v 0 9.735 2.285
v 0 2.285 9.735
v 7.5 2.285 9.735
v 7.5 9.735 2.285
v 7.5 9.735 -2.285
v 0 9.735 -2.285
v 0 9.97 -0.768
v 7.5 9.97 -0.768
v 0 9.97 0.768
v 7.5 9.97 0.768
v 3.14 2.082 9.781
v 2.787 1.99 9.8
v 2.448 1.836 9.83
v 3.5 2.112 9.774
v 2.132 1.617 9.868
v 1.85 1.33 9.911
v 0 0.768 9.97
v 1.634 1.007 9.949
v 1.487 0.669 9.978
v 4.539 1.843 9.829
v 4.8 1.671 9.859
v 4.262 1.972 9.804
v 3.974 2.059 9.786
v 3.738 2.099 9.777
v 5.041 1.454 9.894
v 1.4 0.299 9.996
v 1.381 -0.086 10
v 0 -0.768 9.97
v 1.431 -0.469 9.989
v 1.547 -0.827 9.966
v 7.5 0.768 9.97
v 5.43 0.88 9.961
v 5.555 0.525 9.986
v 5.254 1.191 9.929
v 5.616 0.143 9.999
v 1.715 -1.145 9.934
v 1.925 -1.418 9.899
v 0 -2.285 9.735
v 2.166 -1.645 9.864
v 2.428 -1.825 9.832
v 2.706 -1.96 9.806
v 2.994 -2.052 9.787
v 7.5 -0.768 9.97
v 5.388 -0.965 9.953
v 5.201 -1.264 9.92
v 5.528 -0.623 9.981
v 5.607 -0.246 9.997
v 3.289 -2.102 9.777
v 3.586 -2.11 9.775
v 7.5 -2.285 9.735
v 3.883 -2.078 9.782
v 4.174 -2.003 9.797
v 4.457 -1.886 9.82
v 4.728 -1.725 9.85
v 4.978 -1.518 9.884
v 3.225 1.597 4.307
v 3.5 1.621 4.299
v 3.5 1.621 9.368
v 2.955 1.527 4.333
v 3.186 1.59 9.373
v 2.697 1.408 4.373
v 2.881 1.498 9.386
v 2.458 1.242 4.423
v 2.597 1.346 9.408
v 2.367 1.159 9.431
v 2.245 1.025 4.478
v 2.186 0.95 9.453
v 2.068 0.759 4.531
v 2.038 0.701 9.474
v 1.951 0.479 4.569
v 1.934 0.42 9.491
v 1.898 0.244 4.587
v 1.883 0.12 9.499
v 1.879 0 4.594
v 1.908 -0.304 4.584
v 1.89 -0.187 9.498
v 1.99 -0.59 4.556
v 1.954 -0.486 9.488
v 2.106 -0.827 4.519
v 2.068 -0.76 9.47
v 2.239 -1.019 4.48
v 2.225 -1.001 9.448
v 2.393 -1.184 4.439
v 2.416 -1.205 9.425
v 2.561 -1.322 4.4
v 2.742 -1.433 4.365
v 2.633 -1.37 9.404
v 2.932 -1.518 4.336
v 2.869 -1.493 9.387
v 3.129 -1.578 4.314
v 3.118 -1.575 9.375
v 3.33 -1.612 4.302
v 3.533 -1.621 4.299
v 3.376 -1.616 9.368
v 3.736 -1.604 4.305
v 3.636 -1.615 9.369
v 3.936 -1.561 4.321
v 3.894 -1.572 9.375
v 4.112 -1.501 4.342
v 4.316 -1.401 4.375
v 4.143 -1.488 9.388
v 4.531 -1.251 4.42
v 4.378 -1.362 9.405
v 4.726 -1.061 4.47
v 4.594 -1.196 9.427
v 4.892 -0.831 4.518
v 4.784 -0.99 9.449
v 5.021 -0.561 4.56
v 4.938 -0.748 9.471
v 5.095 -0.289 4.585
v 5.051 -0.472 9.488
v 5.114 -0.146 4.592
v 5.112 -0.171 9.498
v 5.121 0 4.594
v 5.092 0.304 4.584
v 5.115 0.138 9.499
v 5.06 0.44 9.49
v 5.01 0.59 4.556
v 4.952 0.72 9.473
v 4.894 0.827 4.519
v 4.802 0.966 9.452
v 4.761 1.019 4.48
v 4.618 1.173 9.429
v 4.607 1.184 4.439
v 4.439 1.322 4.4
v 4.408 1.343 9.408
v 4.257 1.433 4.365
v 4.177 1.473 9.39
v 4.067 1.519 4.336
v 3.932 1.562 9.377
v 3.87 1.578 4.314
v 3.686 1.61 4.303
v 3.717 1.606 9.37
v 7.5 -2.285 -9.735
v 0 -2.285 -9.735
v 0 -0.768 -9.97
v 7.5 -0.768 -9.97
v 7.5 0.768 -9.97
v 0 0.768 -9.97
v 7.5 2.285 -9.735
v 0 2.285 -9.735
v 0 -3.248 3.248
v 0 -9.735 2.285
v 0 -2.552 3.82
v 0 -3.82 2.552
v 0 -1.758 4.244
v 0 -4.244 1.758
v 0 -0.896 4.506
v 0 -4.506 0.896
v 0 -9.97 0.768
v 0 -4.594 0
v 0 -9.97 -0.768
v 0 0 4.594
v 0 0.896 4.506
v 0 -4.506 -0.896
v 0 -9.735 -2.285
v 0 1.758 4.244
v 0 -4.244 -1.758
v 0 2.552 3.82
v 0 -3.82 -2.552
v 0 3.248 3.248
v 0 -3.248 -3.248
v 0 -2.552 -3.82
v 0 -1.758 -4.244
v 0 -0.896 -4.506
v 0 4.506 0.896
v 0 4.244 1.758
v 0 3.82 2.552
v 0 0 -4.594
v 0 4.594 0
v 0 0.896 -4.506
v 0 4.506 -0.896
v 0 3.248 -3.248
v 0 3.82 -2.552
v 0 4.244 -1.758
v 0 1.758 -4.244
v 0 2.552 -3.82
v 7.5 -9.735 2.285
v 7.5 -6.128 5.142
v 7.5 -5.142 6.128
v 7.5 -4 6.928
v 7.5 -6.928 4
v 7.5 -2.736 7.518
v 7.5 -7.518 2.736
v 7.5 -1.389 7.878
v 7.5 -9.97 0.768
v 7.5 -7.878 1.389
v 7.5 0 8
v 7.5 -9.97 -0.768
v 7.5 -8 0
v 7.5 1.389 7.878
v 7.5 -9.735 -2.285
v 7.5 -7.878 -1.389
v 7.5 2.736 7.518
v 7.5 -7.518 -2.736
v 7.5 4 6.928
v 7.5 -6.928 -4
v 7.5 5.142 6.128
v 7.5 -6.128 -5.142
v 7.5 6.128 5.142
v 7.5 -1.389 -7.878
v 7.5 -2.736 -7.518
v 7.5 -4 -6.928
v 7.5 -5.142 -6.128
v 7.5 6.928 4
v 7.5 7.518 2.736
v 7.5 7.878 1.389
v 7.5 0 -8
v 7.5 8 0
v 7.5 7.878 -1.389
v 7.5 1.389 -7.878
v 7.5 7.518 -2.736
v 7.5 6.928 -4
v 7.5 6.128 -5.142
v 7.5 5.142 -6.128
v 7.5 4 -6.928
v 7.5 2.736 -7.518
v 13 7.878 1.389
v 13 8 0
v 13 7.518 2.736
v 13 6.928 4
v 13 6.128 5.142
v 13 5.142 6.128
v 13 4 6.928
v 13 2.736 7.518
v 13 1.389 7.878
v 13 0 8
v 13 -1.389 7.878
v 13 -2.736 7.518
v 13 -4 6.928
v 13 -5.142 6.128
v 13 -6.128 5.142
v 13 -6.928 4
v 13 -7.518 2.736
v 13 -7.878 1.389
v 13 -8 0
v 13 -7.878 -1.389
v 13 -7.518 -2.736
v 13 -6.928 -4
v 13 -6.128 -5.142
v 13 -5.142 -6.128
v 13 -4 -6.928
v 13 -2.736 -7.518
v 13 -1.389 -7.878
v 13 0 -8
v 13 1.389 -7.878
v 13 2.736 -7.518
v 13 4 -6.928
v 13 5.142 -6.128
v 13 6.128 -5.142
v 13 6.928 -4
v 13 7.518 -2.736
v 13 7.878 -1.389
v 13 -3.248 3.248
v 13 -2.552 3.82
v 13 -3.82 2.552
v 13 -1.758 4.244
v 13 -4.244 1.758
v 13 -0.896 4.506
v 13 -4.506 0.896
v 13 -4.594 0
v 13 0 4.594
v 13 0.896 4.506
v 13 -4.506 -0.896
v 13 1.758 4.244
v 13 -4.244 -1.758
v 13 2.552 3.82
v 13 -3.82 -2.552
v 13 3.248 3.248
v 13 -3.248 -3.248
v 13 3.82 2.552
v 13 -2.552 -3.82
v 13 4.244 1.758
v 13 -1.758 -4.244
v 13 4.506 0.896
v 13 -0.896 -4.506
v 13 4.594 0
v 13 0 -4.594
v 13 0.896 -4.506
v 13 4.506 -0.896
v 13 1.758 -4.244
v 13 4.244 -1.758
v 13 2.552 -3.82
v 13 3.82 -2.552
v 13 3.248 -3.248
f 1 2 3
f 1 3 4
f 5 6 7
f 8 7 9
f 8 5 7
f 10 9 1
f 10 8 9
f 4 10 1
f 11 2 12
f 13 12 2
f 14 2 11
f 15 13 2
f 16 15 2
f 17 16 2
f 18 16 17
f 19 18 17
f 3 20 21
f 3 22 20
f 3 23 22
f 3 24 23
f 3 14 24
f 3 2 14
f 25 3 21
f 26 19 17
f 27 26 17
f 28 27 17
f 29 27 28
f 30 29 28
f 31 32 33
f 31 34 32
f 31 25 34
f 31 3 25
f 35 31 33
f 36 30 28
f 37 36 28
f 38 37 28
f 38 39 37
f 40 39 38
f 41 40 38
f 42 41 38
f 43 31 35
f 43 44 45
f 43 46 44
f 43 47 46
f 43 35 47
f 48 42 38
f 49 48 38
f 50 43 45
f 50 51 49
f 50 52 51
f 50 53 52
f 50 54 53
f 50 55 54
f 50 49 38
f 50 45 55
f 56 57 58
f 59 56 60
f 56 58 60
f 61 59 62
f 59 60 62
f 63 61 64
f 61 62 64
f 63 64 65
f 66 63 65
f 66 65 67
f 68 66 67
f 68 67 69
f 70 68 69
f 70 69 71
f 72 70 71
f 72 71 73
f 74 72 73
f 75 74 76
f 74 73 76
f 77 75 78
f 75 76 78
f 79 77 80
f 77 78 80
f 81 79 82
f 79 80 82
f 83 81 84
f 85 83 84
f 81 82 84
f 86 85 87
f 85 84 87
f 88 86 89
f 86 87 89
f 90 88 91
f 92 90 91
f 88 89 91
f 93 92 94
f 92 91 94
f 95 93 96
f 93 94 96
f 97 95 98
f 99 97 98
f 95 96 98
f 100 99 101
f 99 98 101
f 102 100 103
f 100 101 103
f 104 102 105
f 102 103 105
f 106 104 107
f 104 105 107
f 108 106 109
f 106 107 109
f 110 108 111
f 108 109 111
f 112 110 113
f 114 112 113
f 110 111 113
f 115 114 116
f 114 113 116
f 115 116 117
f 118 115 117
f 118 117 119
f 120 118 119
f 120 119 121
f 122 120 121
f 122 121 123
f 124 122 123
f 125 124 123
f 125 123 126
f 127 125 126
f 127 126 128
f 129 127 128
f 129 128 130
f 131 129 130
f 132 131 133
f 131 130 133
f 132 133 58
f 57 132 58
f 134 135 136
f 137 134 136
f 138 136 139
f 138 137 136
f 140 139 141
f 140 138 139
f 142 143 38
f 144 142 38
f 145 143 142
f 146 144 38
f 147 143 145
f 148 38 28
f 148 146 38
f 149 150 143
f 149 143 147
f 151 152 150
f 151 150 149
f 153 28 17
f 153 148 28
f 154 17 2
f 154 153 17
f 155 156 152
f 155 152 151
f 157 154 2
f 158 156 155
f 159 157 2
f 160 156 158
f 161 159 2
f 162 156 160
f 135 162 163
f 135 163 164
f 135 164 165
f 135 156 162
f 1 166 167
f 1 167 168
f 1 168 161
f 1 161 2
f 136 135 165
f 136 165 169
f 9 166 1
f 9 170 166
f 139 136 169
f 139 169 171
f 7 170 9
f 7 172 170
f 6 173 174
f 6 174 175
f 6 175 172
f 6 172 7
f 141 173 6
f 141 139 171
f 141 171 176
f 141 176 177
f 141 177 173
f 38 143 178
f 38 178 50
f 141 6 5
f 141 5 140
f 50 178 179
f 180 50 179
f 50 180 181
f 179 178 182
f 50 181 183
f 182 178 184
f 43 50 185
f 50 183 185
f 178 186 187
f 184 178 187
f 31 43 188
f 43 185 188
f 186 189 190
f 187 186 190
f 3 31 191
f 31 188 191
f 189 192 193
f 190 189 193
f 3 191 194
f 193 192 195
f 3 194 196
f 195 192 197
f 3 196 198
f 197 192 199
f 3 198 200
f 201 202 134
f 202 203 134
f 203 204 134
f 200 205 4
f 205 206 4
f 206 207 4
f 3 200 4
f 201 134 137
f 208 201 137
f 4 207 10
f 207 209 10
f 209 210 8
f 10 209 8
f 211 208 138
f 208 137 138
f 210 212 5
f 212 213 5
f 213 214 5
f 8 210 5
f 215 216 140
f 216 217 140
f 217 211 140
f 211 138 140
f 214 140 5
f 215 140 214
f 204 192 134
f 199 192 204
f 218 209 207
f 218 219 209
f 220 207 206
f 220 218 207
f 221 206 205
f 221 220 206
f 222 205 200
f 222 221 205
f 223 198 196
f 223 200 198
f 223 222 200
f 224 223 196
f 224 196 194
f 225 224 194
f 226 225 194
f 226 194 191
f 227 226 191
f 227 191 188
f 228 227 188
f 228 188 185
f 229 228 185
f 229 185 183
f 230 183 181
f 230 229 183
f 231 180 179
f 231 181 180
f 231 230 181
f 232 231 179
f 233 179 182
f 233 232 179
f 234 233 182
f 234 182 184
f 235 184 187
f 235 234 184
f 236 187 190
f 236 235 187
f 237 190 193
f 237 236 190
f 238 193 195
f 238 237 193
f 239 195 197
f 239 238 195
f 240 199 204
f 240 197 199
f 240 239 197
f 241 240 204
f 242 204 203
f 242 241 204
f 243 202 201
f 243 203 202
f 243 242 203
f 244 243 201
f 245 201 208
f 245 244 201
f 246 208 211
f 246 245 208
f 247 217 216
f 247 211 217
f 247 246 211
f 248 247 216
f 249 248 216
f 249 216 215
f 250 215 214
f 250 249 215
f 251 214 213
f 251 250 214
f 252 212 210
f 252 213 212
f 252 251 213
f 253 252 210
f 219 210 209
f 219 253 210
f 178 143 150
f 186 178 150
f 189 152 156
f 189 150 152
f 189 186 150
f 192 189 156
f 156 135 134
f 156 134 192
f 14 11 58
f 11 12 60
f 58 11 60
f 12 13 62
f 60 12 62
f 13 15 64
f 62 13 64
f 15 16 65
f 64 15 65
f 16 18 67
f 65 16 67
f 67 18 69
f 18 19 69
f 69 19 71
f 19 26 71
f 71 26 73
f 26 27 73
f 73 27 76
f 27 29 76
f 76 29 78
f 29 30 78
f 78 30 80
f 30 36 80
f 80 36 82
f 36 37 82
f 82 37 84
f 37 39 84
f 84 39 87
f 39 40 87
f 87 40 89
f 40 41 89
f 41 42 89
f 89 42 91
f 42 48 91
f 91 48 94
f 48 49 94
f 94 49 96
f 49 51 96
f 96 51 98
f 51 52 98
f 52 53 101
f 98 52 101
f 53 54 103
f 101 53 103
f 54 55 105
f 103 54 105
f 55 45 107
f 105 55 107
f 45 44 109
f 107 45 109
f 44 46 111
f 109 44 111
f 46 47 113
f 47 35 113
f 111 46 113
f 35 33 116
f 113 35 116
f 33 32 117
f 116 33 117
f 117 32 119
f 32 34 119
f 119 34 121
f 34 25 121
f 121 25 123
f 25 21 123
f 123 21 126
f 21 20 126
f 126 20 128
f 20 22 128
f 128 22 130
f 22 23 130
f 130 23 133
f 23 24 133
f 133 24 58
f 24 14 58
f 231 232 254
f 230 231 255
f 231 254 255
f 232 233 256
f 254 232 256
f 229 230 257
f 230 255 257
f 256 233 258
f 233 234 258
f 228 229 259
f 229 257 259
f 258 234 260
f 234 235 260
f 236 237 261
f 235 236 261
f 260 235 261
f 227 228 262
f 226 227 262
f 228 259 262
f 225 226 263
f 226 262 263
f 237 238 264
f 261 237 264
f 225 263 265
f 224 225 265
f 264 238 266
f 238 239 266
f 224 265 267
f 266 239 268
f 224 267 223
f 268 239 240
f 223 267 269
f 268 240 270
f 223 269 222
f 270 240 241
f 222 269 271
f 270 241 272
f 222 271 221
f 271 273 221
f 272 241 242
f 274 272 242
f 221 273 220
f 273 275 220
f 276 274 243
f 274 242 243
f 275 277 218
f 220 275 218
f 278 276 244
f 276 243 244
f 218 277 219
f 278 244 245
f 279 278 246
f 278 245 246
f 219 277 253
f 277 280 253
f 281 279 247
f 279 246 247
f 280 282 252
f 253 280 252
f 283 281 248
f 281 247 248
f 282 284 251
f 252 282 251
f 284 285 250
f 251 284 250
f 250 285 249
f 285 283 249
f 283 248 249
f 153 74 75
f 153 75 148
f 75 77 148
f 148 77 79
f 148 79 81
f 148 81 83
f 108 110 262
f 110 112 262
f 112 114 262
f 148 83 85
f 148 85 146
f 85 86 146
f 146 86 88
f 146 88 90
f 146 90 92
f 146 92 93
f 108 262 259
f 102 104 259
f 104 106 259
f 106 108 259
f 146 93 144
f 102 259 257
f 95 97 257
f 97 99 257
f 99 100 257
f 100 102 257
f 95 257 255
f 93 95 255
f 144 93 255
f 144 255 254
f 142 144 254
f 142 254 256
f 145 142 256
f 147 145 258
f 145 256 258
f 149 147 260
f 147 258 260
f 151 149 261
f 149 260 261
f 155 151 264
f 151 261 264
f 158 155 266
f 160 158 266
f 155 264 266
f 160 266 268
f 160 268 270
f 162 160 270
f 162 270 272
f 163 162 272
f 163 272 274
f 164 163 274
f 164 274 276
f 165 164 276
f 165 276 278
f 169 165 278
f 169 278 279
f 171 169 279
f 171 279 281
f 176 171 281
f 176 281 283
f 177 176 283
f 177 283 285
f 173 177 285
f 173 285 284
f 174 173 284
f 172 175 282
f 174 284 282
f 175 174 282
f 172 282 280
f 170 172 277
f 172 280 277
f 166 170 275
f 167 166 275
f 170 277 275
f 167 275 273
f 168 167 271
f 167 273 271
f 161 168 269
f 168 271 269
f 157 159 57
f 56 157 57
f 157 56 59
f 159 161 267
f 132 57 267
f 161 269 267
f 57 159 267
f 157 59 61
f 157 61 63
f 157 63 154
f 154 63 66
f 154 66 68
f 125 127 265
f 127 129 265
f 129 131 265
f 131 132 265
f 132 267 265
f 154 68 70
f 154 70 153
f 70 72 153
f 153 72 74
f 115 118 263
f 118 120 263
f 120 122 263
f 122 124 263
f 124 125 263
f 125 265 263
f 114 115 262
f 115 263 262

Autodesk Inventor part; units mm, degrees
ref_plane "YZ Plane" through (0, 0, 0) normal (1, 0, 0) x (0, 1, 0)
ref_plane "XZ Plane" through (0, 0, 0) normal (0, 1, 0) x (-1, 0, 0)
ref_plane "XY Plane" through (0, 0, 0) normal (0, 0, 1) x (1, 0, 0)
sketch "Sketch1" plane through (0, 0, 0) normal (0, 0, 1) x (1, 0, 0)
  line L0 (0, 10) -> (0, 0)
  line L1 (0, 10) -> (7.5, 10)
  line L2 (7.5, 10) -> (7.5, 8)
  line L3 (7.5, 8) -> (13, 8)
  line L4 (13, 8) -> (13, 0)
  line L5 (13, 0) -> (0, 0)
  point P0 (0, 0)
  dimension "d0" = 16
  dimension "d1" = 20
  dimension "d2" = 13
  dimension "d3" = 7.5
revolve "Revolution1" add sketch "Sketch1" angle 360 about axis through (13, 0, 0) along (-1, 0, 0)
hole "Hole1" at (0, 0, 0) direction (1, 0, 0) diameter 9.188 end through all thread size "M10x0.75" class "6H" standard "ISO Metric profile"
sketch "Sketch2" plane through (0, 0, 0) normal (-1, 0, 0) x (0, 0, 1)
  line L0 (0, -12.0208) -> (12.0208, 0)
  line L1 (12.0208, 0) -> (0, 12.0208)
  line L2 (0, 12.0208) -> (-12.0208, 0)
  line L3 (-12.0208, 0) -> (0, -12.0208)
  line L4 (0, -12.0208) -> (0, 12.0208) construction
  line L5 (12.0208, 0) -> (-12.0208, 0) construction
  line L6 (0, -11.9) -> (0, 11.9) projected
  point P0 (0, 0)
  dimension "d14" = 17
extrude "Extrusion1" cut sketch "Sketch2" against normal through all keep common part
sketch "Sketch3" plane through (0, 0, 0) normal (0, 0, 1) x (1, 0, 0)
  line L0 (0, -2.2855) -> (0, 2.2855) projected
  point P0 (0, 0)
  point P1 (3.5, 0)
  point P2 (0, 0)
  dimension "d17" = 3.5
hole "Hole2" at (3.5, 0, 0) direction (0, 0, 1) diameter 3.242 end through all thread size "M4x0.7" class "6H" standard "ISO Metric profile"
chamfer "Chamfer1" distance 0.5 angle 45 1 edges at (3.4896, -1.621, 9.8677)
properties part number "Wellenmutter" material "Steel"
